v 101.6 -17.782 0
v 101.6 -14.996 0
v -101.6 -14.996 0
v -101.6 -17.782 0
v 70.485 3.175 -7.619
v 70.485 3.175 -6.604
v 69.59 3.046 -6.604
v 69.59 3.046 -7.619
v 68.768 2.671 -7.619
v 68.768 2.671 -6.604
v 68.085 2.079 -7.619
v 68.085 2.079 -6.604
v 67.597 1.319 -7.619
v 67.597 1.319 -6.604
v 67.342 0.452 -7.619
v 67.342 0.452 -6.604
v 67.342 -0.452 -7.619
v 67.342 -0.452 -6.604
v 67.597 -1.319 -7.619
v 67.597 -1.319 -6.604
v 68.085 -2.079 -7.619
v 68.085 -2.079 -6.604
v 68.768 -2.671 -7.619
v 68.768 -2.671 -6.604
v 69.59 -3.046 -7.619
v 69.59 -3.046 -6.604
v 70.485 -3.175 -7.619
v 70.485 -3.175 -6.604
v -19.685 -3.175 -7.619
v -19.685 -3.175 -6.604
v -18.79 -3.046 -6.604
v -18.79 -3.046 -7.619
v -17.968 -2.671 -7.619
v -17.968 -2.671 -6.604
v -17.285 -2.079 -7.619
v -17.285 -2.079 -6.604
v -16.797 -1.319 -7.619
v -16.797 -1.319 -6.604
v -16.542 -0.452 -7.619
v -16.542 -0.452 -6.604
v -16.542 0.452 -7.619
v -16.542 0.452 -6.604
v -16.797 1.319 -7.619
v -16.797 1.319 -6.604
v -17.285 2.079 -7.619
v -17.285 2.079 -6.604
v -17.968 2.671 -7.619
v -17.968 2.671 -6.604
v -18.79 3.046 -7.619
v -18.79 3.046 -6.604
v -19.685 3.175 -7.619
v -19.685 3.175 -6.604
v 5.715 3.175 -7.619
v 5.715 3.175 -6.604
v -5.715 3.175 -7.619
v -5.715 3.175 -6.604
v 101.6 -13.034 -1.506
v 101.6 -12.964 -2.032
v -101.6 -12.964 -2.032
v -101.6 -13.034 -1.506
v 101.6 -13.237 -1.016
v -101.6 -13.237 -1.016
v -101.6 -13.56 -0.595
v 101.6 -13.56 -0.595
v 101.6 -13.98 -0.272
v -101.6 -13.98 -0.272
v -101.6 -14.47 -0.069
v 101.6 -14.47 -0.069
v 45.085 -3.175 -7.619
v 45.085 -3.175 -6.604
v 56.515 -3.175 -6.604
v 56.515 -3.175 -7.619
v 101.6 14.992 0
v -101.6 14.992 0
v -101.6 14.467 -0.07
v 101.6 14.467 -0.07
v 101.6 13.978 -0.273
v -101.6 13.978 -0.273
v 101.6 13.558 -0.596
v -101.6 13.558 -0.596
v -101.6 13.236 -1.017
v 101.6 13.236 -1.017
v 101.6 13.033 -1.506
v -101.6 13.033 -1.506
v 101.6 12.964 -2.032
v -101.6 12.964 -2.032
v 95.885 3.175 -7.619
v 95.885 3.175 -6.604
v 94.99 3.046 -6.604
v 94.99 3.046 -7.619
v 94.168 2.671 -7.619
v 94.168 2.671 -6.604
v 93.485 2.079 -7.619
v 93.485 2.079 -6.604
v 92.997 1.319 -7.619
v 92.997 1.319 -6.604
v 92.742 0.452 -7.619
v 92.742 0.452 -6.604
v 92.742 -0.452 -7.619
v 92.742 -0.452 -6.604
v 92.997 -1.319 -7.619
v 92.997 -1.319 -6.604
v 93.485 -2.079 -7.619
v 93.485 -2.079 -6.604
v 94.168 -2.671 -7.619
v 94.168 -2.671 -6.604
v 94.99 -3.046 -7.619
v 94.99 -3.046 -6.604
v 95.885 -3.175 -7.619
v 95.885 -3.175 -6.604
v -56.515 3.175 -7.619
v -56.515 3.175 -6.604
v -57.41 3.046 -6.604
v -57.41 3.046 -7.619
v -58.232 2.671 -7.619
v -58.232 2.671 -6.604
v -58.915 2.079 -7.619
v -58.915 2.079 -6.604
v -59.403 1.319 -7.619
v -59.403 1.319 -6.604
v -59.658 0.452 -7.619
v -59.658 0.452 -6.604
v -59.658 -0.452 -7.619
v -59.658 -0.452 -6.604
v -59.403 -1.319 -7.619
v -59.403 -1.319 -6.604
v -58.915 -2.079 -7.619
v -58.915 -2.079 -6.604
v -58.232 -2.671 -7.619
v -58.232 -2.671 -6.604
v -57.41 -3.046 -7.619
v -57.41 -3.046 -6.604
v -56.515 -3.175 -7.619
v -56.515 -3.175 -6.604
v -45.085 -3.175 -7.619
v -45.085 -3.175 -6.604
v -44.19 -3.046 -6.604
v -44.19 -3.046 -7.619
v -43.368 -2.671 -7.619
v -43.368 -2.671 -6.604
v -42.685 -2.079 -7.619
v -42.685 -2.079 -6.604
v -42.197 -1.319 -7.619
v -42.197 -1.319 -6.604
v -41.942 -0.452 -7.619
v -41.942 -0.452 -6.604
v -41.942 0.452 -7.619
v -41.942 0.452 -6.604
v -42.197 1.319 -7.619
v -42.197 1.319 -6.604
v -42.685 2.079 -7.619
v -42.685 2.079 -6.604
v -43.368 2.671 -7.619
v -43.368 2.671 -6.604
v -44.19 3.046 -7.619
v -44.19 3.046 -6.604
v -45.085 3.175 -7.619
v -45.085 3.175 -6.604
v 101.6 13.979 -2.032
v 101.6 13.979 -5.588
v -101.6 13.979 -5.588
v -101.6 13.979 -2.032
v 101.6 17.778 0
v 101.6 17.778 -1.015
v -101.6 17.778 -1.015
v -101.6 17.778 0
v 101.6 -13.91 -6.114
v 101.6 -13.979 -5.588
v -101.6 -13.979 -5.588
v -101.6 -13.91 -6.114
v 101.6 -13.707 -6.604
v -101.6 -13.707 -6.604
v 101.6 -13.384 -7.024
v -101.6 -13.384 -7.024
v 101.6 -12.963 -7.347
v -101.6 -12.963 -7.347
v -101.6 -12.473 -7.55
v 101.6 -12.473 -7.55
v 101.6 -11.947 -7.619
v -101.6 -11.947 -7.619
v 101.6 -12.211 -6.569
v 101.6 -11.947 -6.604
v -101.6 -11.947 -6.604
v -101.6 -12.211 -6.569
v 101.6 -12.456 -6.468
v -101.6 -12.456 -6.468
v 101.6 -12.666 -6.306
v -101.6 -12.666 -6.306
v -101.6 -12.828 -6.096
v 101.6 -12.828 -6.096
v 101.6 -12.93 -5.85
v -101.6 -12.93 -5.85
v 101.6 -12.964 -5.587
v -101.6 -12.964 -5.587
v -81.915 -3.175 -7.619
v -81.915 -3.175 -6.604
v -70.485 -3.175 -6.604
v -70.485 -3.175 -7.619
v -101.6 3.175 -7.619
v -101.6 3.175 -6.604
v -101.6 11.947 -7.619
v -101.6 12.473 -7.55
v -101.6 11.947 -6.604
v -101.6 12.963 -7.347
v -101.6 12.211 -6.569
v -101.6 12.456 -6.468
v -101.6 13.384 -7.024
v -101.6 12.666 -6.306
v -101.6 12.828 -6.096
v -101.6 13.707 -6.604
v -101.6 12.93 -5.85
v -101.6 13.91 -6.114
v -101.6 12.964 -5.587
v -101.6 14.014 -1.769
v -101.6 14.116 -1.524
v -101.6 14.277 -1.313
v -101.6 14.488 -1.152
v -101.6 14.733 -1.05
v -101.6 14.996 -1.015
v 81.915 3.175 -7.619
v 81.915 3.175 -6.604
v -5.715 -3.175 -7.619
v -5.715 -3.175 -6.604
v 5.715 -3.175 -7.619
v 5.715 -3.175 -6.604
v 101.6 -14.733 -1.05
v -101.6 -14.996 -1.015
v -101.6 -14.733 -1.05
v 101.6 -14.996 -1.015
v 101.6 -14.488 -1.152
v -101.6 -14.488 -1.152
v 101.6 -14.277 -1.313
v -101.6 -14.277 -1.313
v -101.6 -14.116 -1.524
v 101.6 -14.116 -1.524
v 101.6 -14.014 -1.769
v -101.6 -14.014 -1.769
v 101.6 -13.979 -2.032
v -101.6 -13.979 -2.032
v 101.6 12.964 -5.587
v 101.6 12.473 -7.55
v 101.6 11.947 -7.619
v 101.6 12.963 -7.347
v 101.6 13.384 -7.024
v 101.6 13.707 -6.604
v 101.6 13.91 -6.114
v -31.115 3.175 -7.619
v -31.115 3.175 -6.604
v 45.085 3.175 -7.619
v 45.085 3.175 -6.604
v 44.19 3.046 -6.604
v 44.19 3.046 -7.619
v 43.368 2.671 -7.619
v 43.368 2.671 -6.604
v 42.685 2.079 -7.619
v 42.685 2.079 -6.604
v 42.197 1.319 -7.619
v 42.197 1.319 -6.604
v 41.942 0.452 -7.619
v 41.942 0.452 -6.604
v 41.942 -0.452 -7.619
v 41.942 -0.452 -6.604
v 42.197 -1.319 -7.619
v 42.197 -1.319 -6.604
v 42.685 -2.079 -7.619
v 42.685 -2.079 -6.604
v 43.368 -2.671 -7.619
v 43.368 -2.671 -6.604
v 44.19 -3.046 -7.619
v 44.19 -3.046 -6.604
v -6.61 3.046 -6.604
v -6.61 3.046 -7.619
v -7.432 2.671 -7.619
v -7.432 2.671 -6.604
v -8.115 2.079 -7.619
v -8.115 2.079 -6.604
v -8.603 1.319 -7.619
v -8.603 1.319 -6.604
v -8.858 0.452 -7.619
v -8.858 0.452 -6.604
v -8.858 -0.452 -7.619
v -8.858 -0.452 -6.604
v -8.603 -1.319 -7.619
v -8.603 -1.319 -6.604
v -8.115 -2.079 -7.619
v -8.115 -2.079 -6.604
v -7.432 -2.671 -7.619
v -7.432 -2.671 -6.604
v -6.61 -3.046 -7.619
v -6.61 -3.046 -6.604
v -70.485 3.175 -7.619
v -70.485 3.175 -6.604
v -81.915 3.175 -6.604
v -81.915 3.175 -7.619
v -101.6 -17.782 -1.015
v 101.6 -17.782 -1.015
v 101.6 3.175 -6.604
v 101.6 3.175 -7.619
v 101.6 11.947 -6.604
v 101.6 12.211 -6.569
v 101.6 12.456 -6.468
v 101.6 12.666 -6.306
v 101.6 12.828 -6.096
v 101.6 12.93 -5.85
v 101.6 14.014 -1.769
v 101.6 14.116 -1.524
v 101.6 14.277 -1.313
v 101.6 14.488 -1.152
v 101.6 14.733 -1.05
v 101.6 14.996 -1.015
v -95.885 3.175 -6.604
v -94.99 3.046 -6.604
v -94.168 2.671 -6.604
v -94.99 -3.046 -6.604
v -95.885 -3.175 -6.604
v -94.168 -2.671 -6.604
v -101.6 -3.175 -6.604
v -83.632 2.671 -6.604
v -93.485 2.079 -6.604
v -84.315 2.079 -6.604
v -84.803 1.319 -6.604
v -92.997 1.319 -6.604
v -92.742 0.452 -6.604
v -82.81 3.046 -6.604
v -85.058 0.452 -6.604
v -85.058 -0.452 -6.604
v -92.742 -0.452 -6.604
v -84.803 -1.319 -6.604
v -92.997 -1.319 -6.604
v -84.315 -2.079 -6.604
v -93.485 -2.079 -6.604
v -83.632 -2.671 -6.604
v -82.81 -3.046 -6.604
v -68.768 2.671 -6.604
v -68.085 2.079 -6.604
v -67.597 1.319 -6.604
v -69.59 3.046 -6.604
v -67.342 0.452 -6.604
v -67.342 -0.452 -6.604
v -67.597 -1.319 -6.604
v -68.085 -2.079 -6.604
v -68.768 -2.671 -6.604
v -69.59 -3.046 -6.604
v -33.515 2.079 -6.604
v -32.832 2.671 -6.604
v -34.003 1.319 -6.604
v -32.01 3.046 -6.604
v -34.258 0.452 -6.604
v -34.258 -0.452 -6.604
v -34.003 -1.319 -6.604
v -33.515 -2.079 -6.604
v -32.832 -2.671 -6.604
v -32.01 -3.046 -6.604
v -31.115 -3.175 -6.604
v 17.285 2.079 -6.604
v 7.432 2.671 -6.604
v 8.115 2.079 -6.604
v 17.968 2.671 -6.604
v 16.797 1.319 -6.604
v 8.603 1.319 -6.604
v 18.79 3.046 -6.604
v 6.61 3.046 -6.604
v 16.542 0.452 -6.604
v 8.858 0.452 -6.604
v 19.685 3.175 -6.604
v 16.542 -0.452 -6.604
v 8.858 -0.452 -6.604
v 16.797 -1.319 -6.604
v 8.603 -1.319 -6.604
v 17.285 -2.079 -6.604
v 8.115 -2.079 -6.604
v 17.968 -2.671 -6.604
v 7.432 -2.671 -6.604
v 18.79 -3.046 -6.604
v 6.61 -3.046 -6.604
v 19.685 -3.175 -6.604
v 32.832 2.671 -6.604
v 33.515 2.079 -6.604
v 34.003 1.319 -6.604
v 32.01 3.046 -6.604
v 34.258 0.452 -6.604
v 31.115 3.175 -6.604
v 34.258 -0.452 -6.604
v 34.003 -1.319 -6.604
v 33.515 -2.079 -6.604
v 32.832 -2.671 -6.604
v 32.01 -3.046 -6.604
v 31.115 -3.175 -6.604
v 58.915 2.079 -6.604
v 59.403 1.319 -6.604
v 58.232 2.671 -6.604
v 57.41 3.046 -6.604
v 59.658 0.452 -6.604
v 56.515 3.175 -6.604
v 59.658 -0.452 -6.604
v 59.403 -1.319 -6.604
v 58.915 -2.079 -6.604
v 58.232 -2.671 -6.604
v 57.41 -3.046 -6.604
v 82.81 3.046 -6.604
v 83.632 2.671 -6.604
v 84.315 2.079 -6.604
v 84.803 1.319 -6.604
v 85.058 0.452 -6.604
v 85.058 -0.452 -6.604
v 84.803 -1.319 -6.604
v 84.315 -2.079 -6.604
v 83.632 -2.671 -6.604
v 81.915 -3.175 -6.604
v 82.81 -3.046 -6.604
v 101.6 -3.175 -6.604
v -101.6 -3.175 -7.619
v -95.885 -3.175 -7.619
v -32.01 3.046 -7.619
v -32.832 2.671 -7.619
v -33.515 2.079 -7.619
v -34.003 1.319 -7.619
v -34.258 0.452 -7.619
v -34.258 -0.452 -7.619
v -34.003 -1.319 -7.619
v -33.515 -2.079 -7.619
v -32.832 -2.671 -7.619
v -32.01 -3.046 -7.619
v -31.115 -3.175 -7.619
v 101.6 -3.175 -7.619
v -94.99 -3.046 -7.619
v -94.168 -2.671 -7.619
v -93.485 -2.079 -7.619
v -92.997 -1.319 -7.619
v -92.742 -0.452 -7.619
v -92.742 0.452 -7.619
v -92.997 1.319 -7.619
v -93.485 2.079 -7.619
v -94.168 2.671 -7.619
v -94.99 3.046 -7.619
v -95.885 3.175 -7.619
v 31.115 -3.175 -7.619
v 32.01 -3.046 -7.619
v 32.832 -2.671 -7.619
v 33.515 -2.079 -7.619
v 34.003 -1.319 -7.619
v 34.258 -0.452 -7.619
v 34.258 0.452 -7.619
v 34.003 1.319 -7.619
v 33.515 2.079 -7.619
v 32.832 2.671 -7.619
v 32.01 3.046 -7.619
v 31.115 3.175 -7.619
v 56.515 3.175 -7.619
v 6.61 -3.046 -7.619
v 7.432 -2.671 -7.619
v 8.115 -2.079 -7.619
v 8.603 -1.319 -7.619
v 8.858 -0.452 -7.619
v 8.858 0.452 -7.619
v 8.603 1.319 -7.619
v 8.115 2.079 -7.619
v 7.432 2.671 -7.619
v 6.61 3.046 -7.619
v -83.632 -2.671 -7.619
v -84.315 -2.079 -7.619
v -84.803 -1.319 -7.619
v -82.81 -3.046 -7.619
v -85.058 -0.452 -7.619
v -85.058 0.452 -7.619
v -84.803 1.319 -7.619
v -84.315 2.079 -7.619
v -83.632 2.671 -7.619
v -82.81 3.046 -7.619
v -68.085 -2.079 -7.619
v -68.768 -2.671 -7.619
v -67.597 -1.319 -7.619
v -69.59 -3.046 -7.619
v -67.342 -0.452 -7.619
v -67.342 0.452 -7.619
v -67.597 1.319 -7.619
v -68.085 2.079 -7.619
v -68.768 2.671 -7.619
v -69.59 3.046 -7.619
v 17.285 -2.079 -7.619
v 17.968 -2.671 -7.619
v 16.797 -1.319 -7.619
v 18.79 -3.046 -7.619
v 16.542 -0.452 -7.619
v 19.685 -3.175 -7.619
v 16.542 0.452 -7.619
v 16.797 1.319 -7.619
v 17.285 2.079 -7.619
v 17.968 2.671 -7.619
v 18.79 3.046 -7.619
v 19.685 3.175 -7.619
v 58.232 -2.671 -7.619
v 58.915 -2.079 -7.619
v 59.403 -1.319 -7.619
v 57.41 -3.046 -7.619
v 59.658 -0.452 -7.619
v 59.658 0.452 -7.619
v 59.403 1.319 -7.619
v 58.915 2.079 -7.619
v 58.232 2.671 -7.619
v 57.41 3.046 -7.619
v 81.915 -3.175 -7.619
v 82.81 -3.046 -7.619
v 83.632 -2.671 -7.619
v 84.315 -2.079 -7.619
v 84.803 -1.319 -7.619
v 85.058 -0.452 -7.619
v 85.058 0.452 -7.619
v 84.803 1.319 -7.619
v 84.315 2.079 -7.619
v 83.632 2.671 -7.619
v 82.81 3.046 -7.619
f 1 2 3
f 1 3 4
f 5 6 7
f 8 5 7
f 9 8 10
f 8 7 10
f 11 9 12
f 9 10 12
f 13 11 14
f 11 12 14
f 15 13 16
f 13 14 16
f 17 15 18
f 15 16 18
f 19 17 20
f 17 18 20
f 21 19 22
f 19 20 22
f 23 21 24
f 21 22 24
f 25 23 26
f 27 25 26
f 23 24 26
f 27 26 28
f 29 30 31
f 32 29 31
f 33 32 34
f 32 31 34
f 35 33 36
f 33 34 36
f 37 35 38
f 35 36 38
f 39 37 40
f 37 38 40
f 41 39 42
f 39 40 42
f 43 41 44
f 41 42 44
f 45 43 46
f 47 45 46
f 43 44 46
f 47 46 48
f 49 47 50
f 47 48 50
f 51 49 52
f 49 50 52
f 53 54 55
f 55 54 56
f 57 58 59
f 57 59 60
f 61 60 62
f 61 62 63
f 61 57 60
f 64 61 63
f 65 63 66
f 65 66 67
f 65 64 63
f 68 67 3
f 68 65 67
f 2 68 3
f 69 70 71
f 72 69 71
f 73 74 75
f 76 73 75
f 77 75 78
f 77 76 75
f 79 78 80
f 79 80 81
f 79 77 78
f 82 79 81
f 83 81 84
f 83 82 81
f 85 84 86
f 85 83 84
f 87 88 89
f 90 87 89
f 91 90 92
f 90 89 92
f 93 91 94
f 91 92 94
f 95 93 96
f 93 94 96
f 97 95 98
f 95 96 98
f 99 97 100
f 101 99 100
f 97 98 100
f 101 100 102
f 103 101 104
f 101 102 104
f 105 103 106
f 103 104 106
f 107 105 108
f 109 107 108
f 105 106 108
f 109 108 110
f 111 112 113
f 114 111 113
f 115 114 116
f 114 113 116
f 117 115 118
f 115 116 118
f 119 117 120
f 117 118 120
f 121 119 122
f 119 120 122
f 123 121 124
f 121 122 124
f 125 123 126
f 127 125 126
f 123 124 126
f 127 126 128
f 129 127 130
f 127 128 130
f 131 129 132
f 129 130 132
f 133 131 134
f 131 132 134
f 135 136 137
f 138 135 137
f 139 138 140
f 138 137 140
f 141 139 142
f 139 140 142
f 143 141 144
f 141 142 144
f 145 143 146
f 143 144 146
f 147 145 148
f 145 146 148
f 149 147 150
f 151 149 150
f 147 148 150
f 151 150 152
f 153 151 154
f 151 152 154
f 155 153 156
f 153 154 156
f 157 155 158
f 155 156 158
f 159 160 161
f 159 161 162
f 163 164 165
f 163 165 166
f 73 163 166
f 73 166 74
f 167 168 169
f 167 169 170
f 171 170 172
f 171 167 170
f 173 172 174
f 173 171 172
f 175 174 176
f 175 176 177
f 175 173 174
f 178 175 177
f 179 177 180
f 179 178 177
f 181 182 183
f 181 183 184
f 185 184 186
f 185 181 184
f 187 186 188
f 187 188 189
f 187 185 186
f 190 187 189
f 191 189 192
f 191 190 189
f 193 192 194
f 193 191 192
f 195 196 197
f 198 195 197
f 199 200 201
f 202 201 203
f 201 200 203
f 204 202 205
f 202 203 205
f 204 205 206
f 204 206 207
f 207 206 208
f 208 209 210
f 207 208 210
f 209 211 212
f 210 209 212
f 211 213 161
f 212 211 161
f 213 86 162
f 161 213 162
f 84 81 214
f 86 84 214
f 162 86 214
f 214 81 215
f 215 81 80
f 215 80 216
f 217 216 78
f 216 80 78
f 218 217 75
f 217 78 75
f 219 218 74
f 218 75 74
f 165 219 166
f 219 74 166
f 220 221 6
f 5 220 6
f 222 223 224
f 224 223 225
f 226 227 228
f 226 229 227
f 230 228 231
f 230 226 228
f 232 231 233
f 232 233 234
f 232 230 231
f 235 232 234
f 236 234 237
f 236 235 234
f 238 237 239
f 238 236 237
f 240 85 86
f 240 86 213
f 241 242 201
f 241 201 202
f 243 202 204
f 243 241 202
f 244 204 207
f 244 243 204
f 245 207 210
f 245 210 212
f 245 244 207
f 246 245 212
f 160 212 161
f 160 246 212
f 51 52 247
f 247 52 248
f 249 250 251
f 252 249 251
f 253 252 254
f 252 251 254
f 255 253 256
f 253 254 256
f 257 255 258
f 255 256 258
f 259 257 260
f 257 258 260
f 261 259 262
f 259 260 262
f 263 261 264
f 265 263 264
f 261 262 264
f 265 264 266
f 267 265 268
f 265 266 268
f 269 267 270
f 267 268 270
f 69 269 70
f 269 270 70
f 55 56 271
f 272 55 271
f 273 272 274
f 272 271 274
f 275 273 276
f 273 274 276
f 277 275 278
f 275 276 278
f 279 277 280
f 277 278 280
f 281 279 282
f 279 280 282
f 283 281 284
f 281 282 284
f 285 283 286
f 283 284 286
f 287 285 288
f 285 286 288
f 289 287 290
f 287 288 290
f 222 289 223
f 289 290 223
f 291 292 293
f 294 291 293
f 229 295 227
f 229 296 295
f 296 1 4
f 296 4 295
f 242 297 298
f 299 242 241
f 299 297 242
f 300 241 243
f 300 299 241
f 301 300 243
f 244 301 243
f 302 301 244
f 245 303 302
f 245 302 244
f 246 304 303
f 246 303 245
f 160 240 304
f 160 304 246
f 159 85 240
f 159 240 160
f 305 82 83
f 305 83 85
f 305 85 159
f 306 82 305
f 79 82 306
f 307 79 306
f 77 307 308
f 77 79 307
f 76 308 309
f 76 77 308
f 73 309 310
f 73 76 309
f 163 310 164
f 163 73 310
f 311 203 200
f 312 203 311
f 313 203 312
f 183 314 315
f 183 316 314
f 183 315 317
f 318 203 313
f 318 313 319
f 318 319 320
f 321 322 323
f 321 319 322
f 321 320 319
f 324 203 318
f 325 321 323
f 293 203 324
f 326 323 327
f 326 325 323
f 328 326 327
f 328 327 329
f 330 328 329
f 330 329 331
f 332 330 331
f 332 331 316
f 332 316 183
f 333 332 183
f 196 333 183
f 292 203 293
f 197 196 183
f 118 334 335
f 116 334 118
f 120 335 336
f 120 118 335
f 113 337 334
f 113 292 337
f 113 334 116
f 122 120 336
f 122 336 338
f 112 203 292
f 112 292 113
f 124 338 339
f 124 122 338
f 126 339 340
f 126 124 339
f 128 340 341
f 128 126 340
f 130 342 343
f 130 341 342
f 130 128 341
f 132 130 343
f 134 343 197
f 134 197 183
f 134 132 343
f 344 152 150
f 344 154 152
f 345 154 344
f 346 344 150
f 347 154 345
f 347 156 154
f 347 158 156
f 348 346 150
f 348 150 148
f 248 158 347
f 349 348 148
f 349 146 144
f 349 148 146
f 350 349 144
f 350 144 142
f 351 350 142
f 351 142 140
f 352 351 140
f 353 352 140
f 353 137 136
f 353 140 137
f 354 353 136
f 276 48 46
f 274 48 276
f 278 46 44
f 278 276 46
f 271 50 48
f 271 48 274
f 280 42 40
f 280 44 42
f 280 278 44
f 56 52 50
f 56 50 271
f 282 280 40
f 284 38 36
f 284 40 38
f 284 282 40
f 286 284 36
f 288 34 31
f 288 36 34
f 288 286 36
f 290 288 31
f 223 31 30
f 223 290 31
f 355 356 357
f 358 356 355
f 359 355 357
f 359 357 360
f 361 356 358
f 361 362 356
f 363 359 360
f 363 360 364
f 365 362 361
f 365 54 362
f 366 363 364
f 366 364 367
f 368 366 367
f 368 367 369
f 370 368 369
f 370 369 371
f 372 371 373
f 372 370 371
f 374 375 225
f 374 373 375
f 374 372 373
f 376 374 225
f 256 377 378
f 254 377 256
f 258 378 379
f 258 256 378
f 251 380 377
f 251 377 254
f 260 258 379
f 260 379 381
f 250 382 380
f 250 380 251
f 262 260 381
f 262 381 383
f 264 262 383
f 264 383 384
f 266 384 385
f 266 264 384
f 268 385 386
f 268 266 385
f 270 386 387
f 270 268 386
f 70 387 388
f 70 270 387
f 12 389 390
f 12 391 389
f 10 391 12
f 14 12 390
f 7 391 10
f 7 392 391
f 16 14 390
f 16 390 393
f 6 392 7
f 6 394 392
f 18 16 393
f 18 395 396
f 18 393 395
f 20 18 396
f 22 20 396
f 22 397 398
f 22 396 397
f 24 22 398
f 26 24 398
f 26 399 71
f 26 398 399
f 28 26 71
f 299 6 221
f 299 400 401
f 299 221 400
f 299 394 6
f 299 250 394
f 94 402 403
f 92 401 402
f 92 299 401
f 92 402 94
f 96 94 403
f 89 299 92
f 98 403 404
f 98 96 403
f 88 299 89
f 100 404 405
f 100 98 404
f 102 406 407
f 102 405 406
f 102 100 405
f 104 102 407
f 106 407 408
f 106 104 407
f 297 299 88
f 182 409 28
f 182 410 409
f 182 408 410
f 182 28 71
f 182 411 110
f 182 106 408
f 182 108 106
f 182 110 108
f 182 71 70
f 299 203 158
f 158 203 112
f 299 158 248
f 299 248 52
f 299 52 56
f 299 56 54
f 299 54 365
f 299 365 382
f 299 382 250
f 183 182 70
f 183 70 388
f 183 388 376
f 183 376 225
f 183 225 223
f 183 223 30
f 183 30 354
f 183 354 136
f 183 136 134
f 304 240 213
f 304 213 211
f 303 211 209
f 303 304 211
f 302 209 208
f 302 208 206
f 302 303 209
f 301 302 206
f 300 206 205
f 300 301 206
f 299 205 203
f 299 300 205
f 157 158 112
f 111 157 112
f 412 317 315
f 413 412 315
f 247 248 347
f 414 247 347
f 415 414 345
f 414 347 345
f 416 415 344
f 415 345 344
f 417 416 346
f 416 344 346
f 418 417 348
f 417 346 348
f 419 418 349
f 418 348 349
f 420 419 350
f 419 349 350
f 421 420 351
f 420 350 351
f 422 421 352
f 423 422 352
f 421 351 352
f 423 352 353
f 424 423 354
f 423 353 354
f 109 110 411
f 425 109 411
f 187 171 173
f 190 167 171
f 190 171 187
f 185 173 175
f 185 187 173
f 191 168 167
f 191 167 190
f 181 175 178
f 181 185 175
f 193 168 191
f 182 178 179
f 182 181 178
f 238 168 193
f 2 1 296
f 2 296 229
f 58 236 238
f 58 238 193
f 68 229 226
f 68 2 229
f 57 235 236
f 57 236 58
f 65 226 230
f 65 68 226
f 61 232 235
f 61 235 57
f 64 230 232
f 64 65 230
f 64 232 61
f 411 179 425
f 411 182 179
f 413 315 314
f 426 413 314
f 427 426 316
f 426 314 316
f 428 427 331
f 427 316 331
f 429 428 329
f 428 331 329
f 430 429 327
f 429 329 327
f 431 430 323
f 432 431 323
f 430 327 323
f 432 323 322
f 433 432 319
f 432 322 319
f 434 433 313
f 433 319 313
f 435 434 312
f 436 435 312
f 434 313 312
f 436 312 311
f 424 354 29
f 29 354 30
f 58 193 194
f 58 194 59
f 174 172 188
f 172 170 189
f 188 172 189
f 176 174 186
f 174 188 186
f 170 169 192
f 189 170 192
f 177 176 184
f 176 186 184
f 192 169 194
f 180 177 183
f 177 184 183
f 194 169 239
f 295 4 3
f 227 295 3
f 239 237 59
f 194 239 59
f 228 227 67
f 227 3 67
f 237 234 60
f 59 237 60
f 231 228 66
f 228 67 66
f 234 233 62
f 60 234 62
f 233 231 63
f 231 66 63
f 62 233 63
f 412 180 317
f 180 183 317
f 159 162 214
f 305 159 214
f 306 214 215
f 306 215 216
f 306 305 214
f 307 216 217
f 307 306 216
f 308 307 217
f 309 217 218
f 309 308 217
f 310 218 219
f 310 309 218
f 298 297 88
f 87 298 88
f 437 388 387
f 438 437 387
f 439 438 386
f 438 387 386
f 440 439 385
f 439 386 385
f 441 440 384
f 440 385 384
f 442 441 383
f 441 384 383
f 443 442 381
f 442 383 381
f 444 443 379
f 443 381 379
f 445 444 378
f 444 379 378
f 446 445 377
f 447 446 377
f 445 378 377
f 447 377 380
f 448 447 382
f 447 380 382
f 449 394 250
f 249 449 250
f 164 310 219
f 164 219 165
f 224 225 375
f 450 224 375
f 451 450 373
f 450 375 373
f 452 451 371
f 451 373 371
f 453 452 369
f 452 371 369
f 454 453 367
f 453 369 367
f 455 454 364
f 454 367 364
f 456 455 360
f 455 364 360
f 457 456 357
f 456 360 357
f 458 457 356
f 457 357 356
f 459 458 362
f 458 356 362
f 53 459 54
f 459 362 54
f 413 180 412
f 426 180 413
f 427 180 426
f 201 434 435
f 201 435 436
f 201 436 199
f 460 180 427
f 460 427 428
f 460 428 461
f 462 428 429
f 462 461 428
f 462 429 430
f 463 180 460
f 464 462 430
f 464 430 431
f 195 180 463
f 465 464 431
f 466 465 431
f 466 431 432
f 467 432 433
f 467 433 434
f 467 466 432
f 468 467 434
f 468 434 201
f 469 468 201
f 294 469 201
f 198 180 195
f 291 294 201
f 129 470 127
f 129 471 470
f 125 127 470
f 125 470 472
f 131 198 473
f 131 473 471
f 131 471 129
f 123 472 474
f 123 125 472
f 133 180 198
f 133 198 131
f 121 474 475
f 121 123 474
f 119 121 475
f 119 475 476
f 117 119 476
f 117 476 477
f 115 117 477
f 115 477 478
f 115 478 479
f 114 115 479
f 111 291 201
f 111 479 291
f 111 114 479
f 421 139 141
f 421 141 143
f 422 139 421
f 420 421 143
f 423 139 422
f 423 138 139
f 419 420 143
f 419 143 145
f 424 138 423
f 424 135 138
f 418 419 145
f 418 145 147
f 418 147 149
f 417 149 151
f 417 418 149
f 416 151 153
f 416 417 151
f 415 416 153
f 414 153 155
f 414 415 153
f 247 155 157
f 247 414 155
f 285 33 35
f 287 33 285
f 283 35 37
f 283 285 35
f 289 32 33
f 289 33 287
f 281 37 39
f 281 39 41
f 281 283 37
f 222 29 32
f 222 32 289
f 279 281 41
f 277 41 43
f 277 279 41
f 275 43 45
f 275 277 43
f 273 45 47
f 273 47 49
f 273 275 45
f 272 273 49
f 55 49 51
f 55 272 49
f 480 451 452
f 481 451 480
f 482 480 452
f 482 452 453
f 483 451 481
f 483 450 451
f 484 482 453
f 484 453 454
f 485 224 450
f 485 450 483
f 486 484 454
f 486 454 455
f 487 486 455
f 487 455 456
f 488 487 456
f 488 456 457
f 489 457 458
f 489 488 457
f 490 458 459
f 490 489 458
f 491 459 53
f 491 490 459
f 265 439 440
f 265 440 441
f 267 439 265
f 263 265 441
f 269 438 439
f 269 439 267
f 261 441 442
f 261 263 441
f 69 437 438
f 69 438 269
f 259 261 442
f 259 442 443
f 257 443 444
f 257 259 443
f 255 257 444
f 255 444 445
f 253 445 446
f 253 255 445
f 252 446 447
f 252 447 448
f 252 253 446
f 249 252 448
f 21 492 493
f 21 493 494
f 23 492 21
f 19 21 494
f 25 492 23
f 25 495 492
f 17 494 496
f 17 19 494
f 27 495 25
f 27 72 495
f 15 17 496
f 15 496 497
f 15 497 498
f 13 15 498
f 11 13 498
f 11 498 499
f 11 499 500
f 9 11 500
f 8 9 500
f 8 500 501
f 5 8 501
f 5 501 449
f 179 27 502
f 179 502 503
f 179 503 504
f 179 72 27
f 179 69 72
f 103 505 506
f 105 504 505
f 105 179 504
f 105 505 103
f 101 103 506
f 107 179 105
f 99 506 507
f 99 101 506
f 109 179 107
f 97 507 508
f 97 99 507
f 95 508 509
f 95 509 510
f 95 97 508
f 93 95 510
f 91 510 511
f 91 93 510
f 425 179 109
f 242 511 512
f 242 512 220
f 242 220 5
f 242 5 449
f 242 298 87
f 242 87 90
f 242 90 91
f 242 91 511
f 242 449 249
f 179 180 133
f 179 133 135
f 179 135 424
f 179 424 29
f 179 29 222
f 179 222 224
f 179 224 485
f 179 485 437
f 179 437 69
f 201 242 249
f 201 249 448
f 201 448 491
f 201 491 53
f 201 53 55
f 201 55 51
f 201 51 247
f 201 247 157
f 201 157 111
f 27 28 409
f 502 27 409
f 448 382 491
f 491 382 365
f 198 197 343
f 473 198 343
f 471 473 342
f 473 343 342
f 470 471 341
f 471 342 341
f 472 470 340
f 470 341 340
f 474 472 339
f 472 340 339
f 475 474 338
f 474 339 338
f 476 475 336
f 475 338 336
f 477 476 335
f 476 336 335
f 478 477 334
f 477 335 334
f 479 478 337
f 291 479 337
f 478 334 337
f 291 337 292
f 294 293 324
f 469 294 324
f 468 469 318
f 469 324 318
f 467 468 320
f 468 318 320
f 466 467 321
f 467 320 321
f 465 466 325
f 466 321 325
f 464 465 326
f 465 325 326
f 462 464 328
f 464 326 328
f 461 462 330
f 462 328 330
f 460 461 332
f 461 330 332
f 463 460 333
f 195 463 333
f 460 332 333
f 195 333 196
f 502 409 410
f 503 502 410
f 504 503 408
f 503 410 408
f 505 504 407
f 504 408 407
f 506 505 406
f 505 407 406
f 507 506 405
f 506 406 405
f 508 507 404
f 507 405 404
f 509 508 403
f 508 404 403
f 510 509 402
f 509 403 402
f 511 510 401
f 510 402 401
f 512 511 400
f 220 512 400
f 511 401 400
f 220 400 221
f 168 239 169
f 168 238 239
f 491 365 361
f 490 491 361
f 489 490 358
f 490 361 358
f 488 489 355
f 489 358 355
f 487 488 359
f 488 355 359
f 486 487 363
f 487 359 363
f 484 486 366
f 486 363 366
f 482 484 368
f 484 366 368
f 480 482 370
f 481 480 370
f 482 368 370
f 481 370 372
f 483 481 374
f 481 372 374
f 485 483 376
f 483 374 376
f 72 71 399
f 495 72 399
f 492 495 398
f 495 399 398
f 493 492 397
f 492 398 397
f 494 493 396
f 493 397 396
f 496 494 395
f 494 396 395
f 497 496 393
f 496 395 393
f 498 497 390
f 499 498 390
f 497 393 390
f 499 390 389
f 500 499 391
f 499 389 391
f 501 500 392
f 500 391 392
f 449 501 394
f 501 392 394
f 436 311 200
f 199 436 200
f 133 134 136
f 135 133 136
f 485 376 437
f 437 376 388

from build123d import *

# Parameters (mm, degrees)
F1_DEPTH = 101.6
F3_DEPTH = 1.0162968718


# Not quite as in the source:
# - ends of sketch curves that miss each other by under 0.0002 mm in the source are joined


with BuildPart() as f1:
    # F0 (on Right) → F1 (new body, symmetric)
    with BuildSketch(Plane.YZ):
        with BuildLine():
            Line((-13.9794936462, -2.032), (-13.9794936462, -5.5877193844))
            ThreePointArc((-13.9794936462, -5.5877193844), (-13.384185281, -7.0242872241), (-11.9474936901, -7.6192968718))
            Line((-11.9474936901, -7.6192968718), (11.9474936901, -7.6192968718))
            ThreePointArc((11.9474936901, -7.6192968718), (13.3841865534, -7.024285952), (13.9794936469, -5.5877157858))
            Line((13.9794936469, -5.5877157858), (13.9794936469, -2.0319964014))
            ThreePointArc((13.9794936469, -2.0319964014), (14.2772790988, -1.313078725), (14.9961967752, -1.0152932732))
            Line((14.9961967752, -1.0152932732), (17.7780878922, -1.0152932732))
            Line((17.7780878922, -1.0152932732), (17.7780878922, 0))
            Line((17.7780878922, 0), (14.9923725588, 0))
            ThreePointArc((14.9923725588, 0), (13.5581523434, -0.5963598833), (12.9641968184, -2.0315774874))
            Line((12.9641968184, -2.0315774874), (12.9641968184, -5.5872968718))
            ThreePointArc((12.9641968184, -5.5872968718), (12.6664113666, -6.3062145482), (11.9474936901, -6.604))
            Line((11.9474936901, -6.604), (-11.9474936901, -6.604))
            ThreePointArc((-11.9474936901, -6.604), (-12.6664113666, -6.3062145482), (-12.9641968184, -5.5872968718))
            Line((-12.9641968184, -5.5872968718), (-12.9641968184, -2.0315774874))
            ThreePointArc((-12.9641968184, -2.0315774874), (-13.5595051836, -0.5950096476), (-14.9961967744, 0))
            Line((-14.9961967744, 0), (-17.7819121078, 0))
            Line((-17.7819121078, 0), (-17.7819121078, -1.0152932732))
            Line((-17.7819121078, -1.0152932732), (-14.9961967744, -1.0152932732))
            ThreePointArc((-14.9961967744, -1.0152932732), (-14.277279098, -1.3130823236), (-13.9794936462, -2.032))
        make_face()
    extrude(amount=F1_DEPTH, both=True)

    # F2 (on face) → F3 (cut, through all)
    with BuildSketch(Plane.XY.offset(-6.604)):
        with BuildLine():
            Line((-5.715, -3.175), (5.715, -3.175))
            ThreePointArc((5.715, -3.175), (8.89, 0), (5.715, 3.175))
            Line((5.715, 3.175), (-5.715, 3.175))
            ThreePointArc((-5.715, 3.175), (-8.89, 0), (-5.715, -3.175))
        make_face()
        with BuildLine():
            Line((19.685, -3.175), (31.115, -3.175))
            ThreePointArc((31.115, -3.175), (34.29, 0), (31.115, 3.175))
            Line((31.115, 3.175), (19.685, 3.175))
            ThreePointArc((19.685, 3.175), (16.51, 0), (19.685, -3.175))
        make_face()
        with BuildLine():
            Line((45.085, -3.175), (56.515, -3.175))
            ThreePointArc((56.515, -3.175), (59.69, 0), (56.515, 3.175))
            Line((56.515, 3.175), (45.085, 3.175))
            ThreePointArc((45.085, 3.175), (41.91, 0), (45.085, -3.175))
        make_face()
        with BuildLine():
            Line((70.485, -3.175), (81.915, -3.175))
            ThreePointArc((81.915, -3.175), (85.09, 0), (81.915, 3.175))
            Line((81.915, 3.175), (70.485, 3.175))
            ThreePointArc((70.485, 3.175), (67.31, 0), (70.485, -3.175))
        make_face()
        with BuildLine():
            Line((95.885, -3.175), (107.315, -3.175))
            ThreePointArc((107.315, -3.175), (110.49, 0), (107.315, 3.175))
            Line((107.315, 3.175), (95.885, 3.175))
            ThreePointArc((95.885, 3.175), (92.71, 0), (95.885, -3.175))
        make_face()
        with BuildLine():
            Line((-19.685, 3.175), (-31.115, 3.175))
            ThreePointArc((-31.115, 3.175), (-34.29, 0), (-31.115, -3.175))
            Line((-31.115, -3.175), (-19.685, -3.175))
            ThreePointArc((-19.685, -3.175), (-16.51, 0), (-19.685, 3.175))
        make_face()
        with BuildLine():
            Line((-45.085, 3.175), (-56.515, 3.175))
            ThreePointArc((-56.515, 3.175), (-59.69, 0), (-56.515, -3.175))
            Line((-56.515, -3.175), (-45.085, -3.175))
            ThreePointArc((-45.085, -3.175), (-41.91, 0), (-45.085, 3.175))
        make_face()
        with BuildLine():
            Line((-70.485, 3.175), (-81.915, 3.175))
            ThreePointArc((-81.915, 3.175), (-85.09, 0), (-81.915, -3.175))
            Line((-81.915, -3.175), (-70.485, -3.175))
            ThreePointArc((-70.485, -3.175), (-67.31, 0), (-70.485, 3.175))
        make_face()
        with BuildLine():
            Line((-95.885, 3.175), (-107.315, 3.175))
            ThreePointArc((-107.315, 3.175), (-110.49, 0), (-107.315, -3.175))
            Line((-107.315, -3.175), (-95.885, -3.175))
            ThreePointArc((-95.885, -3.175), (-92.71, 0), (-95.885, 3.175))
        make_face()
    extrude(amount=-F3_DEPTH, mode=Mode.SUBTRACT)


solid = f1.part
